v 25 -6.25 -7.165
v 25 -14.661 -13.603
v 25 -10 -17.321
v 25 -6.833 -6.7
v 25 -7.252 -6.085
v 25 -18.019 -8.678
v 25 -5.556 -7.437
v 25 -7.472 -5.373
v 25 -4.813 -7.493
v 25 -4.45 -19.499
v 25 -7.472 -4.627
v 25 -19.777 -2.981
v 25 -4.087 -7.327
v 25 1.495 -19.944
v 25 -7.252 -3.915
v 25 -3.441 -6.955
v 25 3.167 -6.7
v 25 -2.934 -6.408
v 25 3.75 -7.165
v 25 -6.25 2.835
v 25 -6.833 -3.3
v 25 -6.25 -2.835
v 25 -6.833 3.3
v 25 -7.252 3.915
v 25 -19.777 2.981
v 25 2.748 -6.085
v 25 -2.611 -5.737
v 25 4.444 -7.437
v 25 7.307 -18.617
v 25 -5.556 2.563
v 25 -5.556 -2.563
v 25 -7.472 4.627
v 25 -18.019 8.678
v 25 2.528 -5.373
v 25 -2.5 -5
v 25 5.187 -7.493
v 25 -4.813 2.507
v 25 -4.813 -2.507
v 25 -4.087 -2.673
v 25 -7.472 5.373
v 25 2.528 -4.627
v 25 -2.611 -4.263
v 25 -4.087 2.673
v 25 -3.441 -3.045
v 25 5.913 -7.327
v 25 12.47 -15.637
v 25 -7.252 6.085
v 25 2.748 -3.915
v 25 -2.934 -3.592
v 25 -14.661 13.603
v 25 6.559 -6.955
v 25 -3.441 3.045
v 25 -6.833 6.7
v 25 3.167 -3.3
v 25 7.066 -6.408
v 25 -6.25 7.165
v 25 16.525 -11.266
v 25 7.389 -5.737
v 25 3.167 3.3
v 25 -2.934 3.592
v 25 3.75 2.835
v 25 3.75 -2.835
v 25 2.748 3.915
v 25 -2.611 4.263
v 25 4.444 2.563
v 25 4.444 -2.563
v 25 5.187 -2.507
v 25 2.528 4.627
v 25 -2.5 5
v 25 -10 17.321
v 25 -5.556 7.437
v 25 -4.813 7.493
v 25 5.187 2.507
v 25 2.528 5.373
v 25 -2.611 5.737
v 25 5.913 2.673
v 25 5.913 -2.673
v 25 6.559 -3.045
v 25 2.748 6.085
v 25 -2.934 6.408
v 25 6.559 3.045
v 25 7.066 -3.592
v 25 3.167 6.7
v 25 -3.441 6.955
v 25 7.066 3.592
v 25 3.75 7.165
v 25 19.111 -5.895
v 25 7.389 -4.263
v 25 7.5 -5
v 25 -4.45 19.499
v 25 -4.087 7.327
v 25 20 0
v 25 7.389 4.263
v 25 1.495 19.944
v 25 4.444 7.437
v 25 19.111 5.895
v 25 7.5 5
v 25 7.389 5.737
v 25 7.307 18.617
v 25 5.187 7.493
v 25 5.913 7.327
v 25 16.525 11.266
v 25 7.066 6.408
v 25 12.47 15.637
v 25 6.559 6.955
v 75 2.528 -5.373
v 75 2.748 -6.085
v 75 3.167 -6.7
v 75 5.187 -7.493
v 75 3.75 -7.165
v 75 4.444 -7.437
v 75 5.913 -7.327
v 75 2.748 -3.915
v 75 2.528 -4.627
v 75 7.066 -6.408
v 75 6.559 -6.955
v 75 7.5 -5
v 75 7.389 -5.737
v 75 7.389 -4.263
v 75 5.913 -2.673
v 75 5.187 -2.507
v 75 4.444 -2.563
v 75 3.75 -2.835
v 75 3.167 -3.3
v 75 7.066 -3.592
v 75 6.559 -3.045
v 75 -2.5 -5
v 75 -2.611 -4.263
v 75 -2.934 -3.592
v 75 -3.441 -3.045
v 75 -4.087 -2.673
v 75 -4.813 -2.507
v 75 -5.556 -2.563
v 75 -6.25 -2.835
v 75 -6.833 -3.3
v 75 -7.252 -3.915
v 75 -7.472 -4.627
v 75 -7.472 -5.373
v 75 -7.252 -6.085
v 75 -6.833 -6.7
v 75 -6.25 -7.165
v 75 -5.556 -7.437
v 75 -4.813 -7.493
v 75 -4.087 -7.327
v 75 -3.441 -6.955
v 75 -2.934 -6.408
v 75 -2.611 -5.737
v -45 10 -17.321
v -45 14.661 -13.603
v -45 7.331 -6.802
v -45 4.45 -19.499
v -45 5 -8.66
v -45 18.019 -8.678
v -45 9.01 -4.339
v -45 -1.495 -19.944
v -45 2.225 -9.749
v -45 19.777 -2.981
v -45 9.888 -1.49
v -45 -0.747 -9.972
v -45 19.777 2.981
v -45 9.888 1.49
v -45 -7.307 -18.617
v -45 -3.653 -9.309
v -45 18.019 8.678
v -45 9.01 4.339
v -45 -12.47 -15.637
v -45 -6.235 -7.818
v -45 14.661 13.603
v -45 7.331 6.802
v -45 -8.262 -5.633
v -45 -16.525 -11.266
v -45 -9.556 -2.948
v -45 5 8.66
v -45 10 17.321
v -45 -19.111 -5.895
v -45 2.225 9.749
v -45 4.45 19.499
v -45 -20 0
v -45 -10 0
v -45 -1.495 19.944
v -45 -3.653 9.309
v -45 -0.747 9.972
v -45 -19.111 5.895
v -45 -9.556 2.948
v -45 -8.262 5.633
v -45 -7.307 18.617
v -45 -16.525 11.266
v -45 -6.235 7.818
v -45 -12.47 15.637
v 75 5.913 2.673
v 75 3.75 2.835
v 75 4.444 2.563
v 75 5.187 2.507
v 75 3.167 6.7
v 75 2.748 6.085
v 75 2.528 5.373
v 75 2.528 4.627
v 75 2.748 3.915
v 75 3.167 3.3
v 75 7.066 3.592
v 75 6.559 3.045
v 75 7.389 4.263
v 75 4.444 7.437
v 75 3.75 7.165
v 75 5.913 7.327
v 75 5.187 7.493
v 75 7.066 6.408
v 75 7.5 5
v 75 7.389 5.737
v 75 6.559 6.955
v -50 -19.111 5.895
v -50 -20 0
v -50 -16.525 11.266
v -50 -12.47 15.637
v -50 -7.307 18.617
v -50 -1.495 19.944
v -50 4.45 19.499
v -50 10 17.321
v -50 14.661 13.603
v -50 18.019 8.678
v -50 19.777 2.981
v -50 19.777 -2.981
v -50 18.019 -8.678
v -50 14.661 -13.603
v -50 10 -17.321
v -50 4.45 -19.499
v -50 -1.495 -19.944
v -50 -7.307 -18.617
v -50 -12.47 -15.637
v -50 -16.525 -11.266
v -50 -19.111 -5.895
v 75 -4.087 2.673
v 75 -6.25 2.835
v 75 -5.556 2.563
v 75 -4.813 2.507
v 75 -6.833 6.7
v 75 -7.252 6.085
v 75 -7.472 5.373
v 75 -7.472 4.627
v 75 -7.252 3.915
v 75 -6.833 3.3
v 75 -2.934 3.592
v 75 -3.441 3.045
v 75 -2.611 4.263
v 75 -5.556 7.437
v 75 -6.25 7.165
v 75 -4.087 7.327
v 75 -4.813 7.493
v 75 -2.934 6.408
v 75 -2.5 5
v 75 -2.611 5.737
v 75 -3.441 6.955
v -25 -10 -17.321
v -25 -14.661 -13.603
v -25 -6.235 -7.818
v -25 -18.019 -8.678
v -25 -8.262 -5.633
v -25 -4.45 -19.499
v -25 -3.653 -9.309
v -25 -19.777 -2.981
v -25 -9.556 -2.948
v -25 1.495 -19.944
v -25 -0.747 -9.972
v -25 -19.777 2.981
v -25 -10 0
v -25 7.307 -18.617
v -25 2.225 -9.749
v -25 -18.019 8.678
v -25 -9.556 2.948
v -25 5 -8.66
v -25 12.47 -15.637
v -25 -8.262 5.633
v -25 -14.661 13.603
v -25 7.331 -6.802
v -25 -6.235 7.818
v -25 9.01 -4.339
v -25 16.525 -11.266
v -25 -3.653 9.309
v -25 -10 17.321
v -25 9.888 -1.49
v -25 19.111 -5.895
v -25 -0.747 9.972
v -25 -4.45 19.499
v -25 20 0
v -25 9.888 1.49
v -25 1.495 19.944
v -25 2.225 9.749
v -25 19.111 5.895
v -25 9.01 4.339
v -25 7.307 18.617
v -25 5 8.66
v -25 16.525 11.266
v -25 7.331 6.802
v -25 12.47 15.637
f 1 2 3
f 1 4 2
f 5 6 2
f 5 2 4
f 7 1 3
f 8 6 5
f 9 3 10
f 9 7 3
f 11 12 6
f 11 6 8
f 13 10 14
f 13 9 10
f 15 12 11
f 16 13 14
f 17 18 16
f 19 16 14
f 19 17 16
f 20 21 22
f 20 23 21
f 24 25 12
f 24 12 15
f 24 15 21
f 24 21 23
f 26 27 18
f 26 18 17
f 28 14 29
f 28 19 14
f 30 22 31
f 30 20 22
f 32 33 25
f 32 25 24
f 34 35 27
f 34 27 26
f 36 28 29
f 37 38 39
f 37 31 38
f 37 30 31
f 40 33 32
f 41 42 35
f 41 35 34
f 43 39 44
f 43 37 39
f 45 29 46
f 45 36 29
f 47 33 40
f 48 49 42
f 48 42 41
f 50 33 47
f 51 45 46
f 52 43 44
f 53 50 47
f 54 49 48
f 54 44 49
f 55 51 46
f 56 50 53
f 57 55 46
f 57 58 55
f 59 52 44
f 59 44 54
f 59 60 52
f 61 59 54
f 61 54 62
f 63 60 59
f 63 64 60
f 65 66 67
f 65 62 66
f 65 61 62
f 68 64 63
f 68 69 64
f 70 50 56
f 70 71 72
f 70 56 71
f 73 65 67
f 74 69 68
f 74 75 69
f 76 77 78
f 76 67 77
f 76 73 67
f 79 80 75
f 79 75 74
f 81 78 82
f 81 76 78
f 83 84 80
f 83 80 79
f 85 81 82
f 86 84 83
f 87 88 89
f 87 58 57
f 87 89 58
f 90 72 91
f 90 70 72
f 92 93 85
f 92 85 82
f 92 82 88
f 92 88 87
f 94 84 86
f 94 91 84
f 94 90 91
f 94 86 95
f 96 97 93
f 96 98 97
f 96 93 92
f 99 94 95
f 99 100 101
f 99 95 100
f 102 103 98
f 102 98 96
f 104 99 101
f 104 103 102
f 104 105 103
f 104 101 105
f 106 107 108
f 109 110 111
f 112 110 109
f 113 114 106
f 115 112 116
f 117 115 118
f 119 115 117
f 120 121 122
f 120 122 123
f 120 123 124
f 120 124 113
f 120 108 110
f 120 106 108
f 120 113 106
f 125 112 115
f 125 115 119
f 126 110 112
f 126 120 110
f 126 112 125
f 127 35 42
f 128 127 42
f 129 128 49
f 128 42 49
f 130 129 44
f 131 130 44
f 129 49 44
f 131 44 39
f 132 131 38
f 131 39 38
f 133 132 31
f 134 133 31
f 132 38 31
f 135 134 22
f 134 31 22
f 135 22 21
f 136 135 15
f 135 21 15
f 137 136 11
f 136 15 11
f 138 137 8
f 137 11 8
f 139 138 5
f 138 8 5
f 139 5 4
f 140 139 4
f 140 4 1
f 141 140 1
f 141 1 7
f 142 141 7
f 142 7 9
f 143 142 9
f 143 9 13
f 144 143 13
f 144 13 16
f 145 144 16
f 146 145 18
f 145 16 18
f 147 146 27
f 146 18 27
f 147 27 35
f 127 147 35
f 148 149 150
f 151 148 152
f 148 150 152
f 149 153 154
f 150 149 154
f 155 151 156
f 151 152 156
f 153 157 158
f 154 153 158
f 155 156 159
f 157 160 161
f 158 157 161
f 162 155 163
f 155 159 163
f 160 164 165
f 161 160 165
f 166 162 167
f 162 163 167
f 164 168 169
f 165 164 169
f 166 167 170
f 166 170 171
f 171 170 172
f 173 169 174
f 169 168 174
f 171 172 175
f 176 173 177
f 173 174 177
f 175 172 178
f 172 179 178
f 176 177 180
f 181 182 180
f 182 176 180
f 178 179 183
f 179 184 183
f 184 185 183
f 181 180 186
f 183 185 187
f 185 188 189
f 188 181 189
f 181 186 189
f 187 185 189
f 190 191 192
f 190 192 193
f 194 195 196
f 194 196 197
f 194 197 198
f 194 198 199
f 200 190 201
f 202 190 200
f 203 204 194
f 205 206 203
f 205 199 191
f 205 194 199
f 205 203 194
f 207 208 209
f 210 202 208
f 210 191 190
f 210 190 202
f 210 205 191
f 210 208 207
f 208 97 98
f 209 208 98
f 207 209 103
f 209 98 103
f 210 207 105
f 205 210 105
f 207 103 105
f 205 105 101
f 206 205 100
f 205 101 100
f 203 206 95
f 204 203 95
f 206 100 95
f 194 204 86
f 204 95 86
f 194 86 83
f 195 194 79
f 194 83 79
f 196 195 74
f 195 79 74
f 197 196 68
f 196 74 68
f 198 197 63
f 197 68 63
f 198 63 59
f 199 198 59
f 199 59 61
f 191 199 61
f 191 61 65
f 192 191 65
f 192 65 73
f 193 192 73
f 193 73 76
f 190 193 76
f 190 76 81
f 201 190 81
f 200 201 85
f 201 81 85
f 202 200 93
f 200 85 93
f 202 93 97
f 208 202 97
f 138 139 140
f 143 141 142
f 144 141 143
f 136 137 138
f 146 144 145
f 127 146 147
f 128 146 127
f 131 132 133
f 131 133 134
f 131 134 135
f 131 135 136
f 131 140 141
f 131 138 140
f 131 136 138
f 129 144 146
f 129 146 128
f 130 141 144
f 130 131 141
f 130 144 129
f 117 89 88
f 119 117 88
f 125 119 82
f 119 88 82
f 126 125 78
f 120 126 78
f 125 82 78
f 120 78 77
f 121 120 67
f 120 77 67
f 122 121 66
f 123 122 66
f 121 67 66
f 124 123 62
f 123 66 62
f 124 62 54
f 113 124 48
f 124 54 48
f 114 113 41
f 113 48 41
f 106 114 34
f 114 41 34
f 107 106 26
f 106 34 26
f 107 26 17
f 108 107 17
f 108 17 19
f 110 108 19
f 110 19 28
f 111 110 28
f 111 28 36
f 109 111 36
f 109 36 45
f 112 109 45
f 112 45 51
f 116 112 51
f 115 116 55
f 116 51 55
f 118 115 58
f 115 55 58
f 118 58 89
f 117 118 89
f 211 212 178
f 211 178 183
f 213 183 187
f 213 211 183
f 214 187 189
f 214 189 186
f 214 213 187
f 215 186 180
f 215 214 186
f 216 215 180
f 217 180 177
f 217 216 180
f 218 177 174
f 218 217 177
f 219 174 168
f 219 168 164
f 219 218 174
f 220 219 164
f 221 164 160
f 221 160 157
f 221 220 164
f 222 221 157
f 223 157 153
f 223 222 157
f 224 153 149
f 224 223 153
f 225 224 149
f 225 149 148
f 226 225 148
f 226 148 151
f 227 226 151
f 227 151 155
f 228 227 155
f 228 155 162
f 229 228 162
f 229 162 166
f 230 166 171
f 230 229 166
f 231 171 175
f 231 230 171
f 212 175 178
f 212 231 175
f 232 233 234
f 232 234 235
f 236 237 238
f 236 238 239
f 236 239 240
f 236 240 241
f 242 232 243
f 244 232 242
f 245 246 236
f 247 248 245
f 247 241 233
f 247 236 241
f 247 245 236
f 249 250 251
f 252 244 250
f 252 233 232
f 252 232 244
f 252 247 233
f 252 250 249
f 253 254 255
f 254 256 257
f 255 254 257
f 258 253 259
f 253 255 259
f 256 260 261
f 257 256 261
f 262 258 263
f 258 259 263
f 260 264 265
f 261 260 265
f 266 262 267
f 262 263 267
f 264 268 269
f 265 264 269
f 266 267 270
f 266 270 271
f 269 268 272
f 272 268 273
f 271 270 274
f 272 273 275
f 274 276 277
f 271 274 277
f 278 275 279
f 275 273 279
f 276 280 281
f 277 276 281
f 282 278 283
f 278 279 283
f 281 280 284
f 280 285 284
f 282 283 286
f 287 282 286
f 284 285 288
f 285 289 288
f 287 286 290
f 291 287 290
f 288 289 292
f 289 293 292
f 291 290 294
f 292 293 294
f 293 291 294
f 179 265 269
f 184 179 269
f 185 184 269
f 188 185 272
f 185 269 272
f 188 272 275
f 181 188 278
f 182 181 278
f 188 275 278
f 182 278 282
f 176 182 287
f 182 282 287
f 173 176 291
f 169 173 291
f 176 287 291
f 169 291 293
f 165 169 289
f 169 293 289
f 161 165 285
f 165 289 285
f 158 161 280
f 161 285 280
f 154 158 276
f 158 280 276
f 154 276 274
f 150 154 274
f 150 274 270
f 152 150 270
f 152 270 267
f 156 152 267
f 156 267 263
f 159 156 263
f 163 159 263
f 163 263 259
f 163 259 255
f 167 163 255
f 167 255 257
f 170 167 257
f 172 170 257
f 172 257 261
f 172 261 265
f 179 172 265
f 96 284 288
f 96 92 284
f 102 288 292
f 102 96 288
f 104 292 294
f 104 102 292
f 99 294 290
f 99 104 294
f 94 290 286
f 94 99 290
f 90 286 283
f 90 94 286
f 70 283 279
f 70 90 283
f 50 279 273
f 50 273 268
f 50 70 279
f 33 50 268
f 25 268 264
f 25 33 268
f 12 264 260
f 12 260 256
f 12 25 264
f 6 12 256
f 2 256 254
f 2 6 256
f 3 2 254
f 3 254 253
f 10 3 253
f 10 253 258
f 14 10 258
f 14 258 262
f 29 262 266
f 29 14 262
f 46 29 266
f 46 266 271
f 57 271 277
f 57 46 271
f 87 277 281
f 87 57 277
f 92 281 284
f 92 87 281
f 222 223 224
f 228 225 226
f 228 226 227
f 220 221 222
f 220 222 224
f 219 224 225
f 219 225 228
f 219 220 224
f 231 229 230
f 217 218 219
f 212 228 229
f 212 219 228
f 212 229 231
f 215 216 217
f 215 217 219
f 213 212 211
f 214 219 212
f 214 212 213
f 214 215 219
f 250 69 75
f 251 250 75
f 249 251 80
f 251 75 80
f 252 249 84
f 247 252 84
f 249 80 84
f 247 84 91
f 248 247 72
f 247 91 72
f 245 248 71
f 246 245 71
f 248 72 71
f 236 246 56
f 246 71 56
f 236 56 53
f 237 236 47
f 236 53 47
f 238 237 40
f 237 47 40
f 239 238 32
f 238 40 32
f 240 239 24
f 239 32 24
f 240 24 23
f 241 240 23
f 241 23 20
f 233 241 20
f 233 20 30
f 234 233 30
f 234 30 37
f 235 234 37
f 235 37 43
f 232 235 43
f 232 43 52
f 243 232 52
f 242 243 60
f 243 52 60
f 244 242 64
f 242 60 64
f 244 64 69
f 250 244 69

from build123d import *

# Parameters (mm, degrees)
F0_R     = 20
F1_DEPTH = 25
F2_R     = 2.5
F3_DEPTH = 50
F4_R     = 10
F5_DEPTH = 25
F6_R     = 20
F6_R_2   = 10
F7_DEPTH = 5


with BuildPart() as f1:
    # F0 (on Right) → F1 (new body, symmetric)
    with BuildSketch(Plane.YZ):
        Circle(F0_R)
    extrude(amount=F1_DEPTH, both=True)

    # F2 (on face) → F3 (join)
    with BuildSketch(Plane.YZ.offset(25)):
        with Locations((-5, 5)):
            Circle(F2_R)
        with Locations((5, 5)):
            Circle(F2_R)
        with Locations((5, -5)):
            Circle(F2_R)
        with Locations((-5, -5)):
            Circle(F2_R)
    extrude(amount=F3_DEPTH)

    # F4 (on face) → F5 (join)
    with BuildSketch(Plane(origin=(-25, 0, 0), x_dir=(0, -1, 0), z_dir=(-1, 0, 0))):
        Circle(F4_R)
    extrude(amount=F5_DEPTH)

    # F6 (on face) → F7 (join)
    with BuildSketch(Plane(origin=(-50, 0, 0), x_dir=(0, -1, 0), z_dir=(-1, 0, 0))):
        Circle(F6_R)
        Circle(F6_R_2, mode=Mode.SUBTRACT)
    extrude(amount=-F7_DEPTH)


solid = f1.part
